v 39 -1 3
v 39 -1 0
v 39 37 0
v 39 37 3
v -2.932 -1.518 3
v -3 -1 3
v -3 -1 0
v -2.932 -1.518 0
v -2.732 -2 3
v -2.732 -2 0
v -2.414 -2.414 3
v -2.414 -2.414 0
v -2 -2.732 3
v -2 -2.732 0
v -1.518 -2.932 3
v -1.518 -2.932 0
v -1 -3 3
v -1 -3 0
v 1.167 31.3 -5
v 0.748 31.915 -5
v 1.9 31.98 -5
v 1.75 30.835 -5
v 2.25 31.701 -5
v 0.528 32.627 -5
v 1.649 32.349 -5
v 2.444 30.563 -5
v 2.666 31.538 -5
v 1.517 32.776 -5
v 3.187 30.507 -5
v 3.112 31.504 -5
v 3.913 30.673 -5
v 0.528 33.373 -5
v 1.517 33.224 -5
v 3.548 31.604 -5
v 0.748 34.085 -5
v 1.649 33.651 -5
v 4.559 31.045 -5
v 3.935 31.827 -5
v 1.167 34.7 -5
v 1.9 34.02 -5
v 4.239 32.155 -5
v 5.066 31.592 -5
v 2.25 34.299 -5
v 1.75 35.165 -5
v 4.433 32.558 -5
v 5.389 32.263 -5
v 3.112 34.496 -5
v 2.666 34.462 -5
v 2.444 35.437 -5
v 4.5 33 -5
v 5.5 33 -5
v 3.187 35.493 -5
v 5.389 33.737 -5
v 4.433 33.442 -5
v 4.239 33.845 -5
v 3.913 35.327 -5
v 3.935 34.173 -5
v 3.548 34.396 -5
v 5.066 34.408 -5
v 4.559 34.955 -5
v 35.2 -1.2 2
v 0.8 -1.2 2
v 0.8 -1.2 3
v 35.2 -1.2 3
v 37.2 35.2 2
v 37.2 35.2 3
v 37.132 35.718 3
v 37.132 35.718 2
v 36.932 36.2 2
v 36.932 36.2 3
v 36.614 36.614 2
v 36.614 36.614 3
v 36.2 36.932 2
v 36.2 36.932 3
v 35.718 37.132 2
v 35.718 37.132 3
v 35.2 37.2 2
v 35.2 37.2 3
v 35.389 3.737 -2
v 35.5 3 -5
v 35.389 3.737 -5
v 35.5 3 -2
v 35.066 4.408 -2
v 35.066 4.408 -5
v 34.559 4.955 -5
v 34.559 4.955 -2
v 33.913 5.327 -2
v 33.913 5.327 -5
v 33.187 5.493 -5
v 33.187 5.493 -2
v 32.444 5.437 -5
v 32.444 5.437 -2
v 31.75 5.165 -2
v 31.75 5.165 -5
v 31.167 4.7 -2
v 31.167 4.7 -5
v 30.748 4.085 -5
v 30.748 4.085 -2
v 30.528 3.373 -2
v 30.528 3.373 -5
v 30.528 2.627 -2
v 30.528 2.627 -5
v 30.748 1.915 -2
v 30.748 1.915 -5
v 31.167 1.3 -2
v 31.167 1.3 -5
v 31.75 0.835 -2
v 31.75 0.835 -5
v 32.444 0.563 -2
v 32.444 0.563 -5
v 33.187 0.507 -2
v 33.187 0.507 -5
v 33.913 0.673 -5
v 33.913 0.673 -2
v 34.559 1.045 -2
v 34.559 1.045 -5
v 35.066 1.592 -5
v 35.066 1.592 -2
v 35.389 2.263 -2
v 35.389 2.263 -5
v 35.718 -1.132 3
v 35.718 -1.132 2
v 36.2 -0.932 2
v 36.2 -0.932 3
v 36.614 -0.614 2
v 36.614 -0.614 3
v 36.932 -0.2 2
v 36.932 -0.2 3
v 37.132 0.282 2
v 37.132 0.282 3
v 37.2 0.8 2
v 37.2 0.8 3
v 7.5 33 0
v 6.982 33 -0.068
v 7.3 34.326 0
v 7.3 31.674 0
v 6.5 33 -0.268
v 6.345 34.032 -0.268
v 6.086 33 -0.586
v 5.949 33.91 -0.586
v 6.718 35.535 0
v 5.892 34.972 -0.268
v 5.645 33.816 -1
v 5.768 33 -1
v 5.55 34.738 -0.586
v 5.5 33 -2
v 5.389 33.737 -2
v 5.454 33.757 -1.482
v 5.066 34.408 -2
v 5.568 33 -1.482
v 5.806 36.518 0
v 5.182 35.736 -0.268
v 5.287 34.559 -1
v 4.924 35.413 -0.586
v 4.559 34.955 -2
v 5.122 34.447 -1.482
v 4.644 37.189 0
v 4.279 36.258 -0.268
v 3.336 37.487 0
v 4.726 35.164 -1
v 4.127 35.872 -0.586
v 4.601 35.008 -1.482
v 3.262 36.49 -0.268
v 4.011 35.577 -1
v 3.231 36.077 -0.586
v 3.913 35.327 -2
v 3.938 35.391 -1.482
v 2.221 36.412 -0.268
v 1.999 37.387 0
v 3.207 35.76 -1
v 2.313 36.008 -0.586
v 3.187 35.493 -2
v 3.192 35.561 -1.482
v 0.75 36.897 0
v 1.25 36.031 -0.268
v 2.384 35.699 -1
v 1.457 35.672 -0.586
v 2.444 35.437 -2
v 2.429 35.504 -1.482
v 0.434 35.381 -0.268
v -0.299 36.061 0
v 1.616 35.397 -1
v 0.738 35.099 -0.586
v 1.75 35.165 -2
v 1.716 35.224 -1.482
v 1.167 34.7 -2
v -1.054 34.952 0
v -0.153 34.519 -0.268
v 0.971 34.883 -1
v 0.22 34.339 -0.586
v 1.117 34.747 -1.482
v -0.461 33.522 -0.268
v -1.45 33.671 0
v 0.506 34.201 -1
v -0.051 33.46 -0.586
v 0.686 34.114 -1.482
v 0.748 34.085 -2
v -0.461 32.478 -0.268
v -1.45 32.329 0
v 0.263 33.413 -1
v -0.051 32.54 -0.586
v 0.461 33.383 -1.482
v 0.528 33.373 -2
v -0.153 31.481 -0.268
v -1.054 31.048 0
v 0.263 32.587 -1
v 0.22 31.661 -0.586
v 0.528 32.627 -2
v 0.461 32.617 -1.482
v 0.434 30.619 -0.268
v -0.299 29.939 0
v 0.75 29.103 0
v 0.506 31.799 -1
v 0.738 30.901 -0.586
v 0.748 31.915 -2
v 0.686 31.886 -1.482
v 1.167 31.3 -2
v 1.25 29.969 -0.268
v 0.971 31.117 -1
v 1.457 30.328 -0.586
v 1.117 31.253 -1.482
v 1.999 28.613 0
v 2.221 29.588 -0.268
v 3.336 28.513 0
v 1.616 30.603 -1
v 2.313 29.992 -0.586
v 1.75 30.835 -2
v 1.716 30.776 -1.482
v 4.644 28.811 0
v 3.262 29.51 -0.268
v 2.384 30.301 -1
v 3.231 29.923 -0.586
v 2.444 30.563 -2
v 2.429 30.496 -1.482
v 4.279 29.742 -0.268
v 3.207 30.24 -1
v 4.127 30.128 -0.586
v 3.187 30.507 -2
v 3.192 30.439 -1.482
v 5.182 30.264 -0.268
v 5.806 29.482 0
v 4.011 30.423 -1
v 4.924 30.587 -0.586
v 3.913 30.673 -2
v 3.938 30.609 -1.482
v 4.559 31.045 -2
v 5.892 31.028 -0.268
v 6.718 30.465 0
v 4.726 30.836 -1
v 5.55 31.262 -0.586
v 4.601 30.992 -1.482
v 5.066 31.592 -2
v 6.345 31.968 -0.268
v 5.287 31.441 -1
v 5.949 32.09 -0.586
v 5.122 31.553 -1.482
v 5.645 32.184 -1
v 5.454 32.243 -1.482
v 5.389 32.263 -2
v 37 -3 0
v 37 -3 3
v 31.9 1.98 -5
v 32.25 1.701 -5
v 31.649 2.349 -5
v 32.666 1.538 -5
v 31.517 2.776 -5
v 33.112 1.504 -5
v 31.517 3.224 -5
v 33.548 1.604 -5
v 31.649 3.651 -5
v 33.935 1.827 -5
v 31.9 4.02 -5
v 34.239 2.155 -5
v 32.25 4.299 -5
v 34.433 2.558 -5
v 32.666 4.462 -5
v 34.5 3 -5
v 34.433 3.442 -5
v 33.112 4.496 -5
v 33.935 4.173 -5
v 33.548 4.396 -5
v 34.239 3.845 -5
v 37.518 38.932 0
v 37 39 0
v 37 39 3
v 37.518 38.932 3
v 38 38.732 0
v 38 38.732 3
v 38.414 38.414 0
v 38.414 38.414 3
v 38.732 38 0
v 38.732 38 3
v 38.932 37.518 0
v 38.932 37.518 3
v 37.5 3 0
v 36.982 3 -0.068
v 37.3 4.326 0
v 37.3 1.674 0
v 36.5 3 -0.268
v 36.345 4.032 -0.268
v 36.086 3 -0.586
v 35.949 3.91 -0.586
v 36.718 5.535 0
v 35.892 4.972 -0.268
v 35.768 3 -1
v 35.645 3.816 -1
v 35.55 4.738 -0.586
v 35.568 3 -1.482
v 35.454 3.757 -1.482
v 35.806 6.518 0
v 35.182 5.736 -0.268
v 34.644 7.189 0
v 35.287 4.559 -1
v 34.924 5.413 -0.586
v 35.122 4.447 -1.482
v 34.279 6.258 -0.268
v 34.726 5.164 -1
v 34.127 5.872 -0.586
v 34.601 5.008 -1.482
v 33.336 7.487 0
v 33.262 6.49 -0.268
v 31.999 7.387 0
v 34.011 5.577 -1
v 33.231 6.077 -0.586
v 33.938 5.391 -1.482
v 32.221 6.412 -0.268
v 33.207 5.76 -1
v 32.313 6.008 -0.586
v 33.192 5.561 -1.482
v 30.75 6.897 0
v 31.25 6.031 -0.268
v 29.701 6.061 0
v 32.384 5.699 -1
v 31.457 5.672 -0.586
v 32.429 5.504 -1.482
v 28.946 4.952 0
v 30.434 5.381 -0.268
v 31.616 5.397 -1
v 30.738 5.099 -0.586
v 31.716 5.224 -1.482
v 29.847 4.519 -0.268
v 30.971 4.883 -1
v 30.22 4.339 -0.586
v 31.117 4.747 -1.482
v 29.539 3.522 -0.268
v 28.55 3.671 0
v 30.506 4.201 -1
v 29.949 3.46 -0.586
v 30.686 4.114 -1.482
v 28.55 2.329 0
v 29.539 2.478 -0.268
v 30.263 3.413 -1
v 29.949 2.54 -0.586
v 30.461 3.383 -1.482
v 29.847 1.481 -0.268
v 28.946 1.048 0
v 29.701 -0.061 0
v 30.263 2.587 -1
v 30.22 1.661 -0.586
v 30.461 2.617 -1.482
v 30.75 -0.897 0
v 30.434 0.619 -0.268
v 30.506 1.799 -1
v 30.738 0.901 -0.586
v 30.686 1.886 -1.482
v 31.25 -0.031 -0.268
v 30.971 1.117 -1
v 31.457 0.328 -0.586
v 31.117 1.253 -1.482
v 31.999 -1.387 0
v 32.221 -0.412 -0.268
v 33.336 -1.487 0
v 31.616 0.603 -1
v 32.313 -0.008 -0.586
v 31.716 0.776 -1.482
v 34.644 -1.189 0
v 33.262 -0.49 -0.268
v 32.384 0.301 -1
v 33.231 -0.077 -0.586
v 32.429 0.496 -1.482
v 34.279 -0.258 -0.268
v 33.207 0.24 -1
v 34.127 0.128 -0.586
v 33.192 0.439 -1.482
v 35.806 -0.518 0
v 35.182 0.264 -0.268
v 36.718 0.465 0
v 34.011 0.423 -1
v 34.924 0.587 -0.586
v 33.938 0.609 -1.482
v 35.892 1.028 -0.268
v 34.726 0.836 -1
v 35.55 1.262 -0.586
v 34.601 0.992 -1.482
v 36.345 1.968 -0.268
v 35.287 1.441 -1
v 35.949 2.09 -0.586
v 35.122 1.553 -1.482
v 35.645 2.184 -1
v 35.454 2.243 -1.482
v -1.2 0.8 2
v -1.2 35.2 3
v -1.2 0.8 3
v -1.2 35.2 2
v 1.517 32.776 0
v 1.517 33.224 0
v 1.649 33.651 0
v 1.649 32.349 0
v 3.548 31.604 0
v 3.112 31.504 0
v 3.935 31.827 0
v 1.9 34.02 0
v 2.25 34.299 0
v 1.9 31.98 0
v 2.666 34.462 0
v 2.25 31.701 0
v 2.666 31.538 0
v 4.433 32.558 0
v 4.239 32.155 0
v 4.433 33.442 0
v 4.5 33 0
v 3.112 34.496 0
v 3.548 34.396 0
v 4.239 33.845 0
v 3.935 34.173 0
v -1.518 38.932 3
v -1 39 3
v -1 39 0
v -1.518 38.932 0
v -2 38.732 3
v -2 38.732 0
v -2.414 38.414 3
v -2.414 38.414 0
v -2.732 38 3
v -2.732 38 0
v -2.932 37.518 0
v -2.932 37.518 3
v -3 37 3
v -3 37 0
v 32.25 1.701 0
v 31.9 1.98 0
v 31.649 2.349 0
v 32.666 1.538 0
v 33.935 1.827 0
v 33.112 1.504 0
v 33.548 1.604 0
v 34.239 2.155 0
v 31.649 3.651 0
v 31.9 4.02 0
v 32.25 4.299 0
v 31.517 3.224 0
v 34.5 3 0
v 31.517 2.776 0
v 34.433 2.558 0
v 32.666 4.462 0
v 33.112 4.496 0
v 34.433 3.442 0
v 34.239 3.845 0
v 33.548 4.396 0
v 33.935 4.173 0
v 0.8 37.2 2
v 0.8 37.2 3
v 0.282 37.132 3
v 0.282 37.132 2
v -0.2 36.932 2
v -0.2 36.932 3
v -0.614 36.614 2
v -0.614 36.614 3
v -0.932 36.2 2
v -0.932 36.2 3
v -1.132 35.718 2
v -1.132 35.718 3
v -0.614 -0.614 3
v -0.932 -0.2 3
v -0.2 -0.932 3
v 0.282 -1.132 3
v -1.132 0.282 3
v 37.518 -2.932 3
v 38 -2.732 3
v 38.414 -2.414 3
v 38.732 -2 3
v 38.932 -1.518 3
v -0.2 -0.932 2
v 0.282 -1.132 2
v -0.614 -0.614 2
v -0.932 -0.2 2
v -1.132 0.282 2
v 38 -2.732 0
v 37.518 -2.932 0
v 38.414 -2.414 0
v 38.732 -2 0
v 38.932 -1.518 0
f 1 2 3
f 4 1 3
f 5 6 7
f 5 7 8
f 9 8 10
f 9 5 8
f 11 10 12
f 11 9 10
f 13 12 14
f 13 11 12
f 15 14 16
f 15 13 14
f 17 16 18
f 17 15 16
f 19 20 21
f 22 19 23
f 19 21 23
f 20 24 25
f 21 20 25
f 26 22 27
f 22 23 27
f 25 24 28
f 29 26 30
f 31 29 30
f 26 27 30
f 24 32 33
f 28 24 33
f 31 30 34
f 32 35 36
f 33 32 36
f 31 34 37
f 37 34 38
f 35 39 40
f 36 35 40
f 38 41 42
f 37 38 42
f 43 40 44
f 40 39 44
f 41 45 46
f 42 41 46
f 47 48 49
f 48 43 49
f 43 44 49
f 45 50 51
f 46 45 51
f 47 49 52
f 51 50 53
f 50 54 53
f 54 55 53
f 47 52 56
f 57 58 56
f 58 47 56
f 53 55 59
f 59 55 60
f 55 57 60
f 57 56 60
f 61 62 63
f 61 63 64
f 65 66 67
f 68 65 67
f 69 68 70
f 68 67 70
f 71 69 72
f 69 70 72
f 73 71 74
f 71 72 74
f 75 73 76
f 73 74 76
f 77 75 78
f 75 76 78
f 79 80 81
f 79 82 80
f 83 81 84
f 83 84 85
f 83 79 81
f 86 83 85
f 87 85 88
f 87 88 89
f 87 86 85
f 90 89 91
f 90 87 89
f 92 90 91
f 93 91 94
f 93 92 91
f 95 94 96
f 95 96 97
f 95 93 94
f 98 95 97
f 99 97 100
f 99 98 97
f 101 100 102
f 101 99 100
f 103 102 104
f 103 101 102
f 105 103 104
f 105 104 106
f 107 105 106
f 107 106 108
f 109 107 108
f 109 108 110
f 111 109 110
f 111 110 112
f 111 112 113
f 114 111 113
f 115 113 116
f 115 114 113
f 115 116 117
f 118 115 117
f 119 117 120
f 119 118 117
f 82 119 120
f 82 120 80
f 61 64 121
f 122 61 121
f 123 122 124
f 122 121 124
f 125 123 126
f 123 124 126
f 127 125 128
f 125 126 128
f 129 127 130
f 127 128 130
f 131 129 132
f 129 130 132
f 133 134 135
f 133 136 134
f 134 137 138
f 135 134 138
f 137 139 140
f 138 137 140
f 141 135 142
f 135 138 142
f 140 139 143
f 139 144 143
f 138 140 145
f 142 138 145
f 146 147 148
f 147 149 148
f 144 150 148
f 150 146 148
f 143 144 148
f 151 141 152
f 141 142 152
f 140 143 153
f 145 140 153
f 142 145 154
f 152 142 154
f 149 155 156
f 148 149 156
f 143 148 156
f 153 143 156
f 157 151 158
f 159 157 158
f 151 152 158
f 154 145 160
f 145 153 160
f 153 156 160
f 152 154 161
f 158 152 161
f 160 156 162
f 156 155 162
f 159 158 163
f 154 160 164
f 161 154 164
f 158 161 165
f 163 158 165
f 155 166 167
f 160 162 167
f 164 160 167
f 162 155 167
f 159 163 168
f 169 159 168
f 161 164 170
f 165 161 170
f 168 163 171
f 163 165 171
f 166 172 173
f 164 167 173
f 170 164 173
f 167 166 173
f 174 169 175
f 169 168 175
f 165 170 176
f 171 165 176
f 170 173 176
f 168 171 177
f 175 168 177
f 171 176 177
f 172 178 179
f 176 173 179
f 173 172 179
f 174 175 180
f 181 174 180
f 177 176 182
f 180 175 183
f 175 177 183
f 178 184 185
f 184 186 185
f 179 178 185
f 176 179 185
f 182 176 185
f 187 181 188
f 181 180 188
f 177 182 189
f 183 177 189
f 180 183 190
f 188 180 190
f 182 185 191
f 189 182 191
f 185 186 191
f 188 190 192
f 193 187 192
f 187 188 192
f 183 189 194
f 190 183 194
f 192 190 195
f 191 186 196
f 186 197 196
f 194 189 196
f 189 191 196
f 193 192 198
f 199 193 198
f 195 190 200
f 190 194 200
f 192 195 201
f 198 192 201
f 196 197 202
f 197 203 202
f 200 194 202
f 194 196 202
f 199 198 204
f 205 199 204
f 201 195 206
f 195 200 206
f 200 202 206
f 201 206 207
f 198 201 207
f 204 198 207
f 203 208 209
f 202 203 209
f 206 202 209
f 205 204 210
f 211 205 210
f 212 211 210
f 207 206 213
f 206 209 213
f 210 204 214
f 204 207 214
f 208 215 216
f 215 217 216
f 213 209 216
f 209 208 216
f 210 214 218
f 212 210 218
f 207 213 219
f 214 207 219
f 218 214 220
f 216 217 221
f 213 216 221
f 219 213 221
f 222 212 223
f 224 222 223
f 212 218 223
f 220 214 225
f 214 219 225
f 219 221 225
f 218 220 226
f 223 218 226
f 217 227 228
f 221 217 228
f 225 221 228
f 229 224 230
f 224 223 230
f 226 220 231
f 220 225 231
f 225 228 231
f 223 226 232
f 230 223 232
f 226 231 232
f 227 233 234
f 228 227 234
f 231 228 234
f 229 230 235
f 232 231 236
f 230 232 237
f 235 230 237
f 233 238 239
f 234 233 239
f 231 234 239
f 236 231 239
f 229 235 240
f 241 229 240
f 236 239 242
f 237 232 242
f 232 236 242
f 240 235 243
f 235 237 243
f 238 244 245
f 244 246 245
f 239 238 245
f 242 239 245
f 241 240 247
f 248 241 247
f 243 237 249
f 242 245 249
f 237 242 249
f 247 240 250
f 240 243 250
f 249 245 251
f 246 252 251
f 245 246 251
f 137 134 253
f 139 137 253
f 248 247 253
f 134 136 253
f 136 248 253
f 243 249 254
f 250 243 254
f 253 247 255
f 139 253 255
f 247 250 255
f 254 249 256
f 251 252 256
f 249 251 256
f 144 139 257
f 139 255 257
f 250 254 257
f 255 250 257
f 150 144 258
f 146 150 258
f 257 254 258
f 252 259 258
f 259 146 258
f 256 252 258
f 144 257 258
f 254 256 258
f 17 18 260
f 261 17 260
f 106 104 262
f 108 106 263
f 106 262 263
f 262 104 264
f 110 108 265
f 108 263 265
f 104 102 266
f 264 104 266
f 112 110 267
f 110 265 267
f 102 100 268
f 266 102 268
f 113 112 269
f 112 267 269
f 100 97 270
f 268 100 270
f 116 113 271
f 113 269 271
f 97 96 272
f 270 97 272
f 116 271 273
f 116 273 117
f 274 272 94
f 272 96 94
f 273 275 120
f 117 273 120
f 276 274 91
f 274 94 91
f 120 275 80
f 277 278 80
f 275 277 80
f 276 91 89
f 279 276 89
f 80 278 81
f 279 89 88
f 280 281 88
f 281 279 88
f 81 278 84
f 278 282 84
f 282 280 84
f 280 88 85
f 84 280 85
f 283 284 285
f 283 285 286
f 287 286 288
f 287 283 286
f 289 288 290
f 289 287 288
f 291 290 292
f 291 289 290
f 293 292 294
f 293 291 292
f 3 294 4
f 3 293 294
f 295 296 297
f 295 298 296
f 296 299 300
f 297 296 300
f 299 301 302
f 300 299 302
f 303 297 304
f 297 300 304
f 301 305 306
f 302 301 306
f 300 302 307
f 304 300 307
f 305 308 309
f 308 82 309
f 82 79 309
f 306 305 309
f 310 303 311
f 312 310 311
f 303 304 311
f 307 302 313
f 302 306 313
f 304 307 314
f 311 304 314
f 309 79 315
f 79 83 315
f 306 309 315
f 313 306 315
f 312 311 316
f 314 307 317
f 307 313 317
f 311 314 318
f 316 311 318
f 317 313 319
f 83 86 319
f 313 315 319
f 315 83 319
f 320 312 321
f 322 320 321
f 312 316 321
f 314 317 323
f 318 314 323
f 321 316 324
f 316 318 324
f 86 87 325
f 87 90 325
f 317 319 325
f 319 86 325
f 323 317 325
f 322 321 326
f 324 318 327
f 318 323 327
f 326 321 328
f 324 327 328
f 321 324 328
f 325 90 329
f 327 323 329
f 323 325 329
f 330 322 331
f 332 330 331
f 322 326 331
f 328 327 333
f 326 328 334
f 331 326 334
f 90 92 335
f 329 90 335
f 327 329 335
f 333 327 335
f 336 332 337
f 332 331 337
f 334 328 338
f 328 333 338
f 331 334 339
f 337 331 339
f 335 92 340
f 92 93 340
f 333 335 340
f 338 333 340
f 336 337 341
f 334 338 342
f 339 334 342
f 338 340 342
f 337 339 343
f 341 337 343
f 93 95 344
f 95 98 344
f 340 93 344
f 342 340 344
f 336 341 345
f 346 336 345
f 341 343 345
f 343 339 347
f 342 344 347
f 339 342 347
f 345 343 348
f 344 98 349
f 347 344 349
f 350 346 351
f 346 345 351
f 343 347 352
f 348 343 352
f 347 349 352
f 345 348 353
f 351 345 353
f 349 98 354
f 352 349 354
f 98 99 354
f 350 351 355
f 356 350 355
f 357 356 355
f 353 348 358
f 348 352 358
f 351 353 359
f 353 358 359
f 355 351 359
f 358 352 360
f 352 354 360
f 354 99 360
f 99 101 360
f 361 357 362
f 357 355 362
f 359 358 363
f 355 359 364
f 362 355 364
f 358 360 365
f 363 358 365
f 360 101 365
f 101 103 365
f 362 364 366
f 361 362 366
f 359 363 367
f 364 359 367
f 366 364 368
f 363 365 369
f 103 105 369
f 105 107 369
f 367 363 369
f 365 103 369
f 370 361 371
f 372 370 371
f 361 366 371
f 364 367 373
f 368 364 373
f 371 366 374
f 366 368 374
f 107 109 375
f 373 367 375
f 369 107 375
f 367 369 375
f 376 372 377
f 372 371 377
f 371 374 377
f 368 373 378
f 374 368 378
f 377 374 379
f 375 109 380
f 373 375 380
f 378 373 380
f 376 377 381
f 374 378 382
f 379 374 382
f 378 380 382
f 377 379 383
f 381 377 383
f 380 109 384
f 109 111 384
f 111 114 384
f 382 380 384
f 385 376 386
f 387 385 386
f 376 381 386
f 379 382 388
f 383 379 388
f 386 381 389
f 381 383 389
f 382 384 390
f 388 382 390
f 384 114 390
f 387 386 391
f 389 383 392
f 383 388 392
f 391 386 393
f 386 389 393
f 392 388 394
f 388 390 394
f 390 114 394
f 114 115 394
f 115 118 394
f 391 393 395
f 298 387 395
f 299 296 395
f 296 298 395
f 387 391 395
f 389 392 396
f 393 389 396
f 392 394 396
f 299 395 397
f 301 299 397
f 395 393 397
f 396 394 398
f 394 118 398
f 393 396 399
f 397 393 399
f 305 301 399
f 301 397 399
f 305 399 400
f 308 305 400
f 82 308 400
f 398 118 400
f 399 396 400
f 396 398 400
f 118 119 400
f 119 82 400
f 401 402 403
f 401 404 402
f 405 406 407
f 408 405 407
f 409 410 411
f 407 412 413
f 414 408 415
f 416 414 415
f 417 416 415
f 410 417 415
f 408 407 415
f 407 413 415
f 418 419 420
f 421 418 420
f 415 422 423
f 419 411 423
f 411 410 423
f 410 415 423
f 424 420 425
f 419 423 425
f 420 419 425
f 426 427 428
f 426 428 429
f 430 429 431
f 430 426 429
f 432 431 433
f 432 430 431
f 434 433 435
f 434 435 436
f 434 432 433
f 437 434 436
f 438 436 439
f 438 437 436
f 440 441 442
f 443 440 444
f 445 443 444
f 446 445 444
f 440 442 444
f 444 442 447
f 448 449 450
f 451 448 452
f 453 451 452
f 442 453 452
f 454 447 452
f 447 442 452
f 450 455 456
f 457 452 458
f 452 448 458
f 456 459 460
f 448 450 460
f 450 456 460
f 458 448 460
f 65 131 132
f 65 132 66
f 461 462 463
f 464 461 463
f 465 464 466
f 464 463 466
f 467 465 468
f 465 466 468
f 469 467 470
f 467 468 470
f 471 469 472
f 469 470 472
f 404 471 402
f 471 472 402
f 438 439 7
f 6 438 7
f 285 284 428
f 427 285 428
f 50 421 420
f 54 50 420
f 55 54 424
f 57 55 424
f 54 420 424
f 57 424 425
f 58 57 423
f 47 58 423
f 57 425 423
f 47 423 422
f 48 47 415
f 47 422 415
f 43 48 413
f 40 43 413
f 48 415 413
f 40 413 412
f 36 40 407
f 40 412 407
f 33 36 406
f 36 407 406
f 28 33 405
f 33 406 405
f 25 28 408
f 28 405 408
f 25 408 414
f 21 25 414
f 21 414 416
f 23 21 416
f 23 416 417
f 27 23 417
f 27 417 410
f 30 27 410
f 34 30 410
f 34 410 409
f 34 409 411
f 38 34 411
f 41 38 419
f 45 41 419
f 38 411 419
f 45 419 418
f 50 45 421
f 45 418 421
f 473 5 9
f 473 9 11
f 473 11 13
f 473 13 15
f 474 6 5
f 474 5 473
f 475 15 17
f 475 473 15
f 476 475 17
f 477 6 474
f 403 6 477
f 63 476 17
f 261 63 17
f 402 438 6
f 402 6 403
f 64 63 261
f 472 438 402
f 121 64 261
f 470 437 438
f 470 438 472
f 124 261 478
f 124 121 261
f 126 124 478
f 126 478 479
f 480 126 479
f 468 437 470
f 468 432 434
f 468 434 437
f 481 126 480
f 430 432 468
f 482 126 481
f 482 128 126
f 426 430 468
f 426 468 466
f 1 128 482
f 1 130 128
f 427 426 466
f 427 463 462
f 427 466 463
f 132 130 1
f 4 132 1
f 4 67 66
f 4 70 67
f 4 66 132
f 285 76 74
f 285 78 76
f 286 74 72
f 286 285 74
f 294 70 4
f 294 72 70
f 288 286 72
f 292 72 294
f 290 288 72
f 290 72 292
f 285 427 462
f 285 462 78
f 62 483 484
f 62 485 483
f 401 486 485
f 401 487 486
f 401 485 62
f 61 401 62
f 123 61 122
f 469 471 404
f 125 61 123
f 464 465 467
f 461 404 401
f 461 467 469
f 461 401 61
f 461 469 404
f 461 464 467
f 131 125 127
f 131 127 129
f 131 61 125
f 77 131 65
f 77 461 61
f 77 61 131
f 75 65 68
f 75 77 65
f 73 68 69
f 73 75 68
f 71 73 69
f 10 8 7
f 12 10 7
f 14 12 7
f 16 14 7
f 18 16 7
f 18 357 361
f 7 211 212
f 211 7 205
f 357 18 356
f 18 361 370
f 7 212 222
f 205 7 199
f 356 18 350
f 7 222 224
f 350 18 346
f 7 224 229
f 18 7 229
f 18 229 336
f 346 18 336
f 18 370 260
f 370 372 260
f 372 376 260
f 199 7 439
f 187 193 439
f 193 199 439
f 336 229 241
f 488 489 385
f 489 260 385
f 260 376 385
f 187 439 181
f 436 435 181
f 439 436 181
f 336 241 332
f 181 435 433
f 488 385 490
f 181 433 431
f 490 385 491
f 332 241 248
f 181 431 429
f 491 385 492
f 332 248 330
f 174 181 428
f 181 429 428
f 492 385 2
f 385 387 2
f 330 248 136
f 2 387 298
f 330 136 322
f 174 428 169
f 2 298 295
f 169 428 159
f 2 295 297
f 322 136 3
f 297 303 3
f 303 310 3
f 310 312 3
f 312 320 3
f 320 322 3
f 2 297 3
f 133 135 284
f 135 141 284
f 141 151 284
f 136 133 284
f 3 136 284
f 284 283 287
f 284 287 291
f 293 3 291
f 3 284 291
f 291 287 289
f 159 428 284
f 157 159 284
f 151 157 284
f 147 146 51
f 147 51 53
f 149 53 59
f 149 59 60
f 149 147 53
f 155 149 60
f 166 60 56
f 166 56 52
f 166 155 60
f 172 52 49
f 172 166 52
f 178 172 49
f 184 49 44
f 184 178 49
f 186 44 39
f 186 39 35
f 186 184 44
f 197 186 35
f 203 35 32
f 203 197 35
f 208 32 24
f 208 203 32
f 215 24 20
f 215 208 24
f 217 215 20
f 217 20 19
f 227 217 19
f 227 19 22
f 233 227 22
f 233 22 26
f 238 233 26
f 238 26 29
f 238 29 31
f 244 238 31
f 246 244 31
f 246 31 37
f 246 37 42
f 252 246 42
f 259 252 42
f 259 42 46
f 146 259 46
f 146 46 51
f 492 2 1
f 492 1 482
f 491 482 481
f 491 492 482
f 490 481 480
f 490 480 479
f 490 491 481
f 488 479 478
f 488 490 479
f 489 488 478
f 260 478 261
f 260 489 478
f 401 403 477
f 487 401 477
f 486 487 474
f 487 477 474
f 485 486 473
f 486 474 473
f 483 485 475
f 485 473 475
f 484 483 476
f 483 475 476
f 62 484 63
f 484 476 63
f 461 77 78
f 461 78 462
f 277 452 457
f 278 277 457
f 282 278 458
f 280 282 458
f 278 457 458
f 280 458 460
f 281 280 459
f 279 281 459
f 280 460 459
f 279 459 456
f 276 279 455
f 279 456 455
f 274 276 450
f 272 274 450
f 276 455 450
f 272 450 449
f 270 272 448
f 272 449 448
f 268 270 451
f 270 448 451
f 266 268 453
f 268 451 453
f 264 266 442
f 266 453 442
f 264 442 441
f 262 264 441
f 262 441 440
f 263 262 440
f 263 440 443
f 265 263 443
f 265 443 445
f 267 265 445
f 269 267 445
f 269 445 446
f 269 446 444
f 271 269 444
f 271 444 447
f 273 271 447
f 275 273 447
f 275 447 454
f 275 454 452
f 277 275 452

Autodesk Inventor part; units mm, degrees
ref_plane "YZ Plane" through (0, 0, 0) normal (1, 0, 0) x (0, 1, 0)
ref_plane "XZ Plane" through (0, 0, 0) normal (0, 1, 0) x (-1, 0, 0)
ref_plane "XY Plane" through (0, 0, 0) normal (0, 0, 1) x (1, 0, 0)
sketch "Sketch Base" plane through (0, 0, 0) normal (0, 0, 1) x (1, 0, 0)
  line L0 (0, 0) -> (36, 0)
  line L1 (36, 0) -> (36, 36)
  line L2 (36, 36) -> (0, 36)
  line L3 (0, 36) -> (0, 0)
  line L4 (0, 0) -> (36, 36) construction
  line L5 (36, 0) -> (0, 36) construction
  line L6 (3, 3) -> (33, 3) construction
  line L7 (33, 3) -> (33, 33) construction
  line L8 (33, 33) -> (3, 33) construction
  line L9 (3, 33) -> (3, 3) construction
  line L10 (3, 3) -> (33, 33) construction
  line L11 (33, 3) -> (3, 33) construction
  circle A0 centre (3, 33) radius 1.5
  circle A1 centre (33, 3) radius 1.5
  circle A2 centre (3, 33) radius 2.5
  circle A3 centre (33, 3) radius 2.5
  line L12 (-1, -1) -> (37, -1)
  line L13 (37, -1) -> (37, 37)
  line L14 (37, 37) -> (-1, 37)
  line L15 (-1, 37) -> (-1, -1)
  line L16 (-1, -1) -> (37, 37) construction
  line L17 (37, -1) -> (-1, 37) construction
  line L18 (-3, -3) -> (39, -3)
  line L19 (39, -3) -> (39, 39)
  line L20 (39, 39) -> (-3, 39)
  line L21 (-3, 39) -> (-3, -3)
  line L22 (-3, -3) -> (39, 39) construction
  line L23 (39, -3) -> (-3, 39) construction
  point P0 (18, 18)
  dimension "d0" = 36
  dimension "d1" = 36
  dimension "d2" = 30
  dimension "d3" = 30
  dimension "d4" = 3
  dimension "d6" = 3
  dimension "d8" = 5
  dimension "d11" = 5
  dimension "d12" = 38
  dimension "d13" = 38
  dimension "d14" = 42
  dimension "d15" = 42
extrude "Extrusion1" add sketch "Sketch Base" against normal blind 5 contours A2 | A3
extrude "Extrusion5" add sketch "Sketch Base" along normal blind 2 contours L3 L2 L1 L0 | A0 | A1 | A2 | A3 | L15 L14 L13 L12 | L21 L20 L19 L18
sketch "Sketch2" plane through (0, 0, 2) normal (0, 0, 1) x (1, 0, 0)
  line L0 (-3, 39) -> (-3, -3) projected
  line L1 (39, -3) -> (39, 39) projected
  line L2 (-3, -3) -> (39, -3)
  line L3 (39, -3) -> (39, 39)
  line L4 (39, 39) -> (-3, 39)
  line L5 (-3, 39) -> (-3, -3)
  line L6 (-3, -3) -> (39, 39) construction
  line L7 (-1.2, -1.2) -> (37.2, -1.2)
  line L8 (37.2, -1.2) -> (37.2, 37.2)
  line L9 (37.2, 37.2) -> (-1.2, 37.2)
  line L10 (-1.2, 37.2) -> (-1.2, -1.2)
  line L11 (-1.2, -1.2) -> (37.2, 37.2) construction
  line L12 (37.2, -1.2) -> (-1.2, 37.2) construction
  point P0 (0, 0)
  point P1 (18, 18)
  dimension "d30" = 38.4
  dimension "d31" = 38.4
extrude "Extrusion8" add sketch "Sketch2" along normal blind 1
fillet "Fillet1" radius 2 8 edges at (-3, -3, 1.5) (-3, 39, 1.5) (39, 39, 1.5) (39, -3, 1.5) (-1.2, 37.2, 2.5) (37.2, 37.2, 2.5) (37.2, -1.2, 2.5) (-1.2, -1.2, 2.5)
fillet "Fillet2" radius 2 2 edges at (0.5, 33, 0) (30.5, 3, 0)
properties part number "Controller Mount"
